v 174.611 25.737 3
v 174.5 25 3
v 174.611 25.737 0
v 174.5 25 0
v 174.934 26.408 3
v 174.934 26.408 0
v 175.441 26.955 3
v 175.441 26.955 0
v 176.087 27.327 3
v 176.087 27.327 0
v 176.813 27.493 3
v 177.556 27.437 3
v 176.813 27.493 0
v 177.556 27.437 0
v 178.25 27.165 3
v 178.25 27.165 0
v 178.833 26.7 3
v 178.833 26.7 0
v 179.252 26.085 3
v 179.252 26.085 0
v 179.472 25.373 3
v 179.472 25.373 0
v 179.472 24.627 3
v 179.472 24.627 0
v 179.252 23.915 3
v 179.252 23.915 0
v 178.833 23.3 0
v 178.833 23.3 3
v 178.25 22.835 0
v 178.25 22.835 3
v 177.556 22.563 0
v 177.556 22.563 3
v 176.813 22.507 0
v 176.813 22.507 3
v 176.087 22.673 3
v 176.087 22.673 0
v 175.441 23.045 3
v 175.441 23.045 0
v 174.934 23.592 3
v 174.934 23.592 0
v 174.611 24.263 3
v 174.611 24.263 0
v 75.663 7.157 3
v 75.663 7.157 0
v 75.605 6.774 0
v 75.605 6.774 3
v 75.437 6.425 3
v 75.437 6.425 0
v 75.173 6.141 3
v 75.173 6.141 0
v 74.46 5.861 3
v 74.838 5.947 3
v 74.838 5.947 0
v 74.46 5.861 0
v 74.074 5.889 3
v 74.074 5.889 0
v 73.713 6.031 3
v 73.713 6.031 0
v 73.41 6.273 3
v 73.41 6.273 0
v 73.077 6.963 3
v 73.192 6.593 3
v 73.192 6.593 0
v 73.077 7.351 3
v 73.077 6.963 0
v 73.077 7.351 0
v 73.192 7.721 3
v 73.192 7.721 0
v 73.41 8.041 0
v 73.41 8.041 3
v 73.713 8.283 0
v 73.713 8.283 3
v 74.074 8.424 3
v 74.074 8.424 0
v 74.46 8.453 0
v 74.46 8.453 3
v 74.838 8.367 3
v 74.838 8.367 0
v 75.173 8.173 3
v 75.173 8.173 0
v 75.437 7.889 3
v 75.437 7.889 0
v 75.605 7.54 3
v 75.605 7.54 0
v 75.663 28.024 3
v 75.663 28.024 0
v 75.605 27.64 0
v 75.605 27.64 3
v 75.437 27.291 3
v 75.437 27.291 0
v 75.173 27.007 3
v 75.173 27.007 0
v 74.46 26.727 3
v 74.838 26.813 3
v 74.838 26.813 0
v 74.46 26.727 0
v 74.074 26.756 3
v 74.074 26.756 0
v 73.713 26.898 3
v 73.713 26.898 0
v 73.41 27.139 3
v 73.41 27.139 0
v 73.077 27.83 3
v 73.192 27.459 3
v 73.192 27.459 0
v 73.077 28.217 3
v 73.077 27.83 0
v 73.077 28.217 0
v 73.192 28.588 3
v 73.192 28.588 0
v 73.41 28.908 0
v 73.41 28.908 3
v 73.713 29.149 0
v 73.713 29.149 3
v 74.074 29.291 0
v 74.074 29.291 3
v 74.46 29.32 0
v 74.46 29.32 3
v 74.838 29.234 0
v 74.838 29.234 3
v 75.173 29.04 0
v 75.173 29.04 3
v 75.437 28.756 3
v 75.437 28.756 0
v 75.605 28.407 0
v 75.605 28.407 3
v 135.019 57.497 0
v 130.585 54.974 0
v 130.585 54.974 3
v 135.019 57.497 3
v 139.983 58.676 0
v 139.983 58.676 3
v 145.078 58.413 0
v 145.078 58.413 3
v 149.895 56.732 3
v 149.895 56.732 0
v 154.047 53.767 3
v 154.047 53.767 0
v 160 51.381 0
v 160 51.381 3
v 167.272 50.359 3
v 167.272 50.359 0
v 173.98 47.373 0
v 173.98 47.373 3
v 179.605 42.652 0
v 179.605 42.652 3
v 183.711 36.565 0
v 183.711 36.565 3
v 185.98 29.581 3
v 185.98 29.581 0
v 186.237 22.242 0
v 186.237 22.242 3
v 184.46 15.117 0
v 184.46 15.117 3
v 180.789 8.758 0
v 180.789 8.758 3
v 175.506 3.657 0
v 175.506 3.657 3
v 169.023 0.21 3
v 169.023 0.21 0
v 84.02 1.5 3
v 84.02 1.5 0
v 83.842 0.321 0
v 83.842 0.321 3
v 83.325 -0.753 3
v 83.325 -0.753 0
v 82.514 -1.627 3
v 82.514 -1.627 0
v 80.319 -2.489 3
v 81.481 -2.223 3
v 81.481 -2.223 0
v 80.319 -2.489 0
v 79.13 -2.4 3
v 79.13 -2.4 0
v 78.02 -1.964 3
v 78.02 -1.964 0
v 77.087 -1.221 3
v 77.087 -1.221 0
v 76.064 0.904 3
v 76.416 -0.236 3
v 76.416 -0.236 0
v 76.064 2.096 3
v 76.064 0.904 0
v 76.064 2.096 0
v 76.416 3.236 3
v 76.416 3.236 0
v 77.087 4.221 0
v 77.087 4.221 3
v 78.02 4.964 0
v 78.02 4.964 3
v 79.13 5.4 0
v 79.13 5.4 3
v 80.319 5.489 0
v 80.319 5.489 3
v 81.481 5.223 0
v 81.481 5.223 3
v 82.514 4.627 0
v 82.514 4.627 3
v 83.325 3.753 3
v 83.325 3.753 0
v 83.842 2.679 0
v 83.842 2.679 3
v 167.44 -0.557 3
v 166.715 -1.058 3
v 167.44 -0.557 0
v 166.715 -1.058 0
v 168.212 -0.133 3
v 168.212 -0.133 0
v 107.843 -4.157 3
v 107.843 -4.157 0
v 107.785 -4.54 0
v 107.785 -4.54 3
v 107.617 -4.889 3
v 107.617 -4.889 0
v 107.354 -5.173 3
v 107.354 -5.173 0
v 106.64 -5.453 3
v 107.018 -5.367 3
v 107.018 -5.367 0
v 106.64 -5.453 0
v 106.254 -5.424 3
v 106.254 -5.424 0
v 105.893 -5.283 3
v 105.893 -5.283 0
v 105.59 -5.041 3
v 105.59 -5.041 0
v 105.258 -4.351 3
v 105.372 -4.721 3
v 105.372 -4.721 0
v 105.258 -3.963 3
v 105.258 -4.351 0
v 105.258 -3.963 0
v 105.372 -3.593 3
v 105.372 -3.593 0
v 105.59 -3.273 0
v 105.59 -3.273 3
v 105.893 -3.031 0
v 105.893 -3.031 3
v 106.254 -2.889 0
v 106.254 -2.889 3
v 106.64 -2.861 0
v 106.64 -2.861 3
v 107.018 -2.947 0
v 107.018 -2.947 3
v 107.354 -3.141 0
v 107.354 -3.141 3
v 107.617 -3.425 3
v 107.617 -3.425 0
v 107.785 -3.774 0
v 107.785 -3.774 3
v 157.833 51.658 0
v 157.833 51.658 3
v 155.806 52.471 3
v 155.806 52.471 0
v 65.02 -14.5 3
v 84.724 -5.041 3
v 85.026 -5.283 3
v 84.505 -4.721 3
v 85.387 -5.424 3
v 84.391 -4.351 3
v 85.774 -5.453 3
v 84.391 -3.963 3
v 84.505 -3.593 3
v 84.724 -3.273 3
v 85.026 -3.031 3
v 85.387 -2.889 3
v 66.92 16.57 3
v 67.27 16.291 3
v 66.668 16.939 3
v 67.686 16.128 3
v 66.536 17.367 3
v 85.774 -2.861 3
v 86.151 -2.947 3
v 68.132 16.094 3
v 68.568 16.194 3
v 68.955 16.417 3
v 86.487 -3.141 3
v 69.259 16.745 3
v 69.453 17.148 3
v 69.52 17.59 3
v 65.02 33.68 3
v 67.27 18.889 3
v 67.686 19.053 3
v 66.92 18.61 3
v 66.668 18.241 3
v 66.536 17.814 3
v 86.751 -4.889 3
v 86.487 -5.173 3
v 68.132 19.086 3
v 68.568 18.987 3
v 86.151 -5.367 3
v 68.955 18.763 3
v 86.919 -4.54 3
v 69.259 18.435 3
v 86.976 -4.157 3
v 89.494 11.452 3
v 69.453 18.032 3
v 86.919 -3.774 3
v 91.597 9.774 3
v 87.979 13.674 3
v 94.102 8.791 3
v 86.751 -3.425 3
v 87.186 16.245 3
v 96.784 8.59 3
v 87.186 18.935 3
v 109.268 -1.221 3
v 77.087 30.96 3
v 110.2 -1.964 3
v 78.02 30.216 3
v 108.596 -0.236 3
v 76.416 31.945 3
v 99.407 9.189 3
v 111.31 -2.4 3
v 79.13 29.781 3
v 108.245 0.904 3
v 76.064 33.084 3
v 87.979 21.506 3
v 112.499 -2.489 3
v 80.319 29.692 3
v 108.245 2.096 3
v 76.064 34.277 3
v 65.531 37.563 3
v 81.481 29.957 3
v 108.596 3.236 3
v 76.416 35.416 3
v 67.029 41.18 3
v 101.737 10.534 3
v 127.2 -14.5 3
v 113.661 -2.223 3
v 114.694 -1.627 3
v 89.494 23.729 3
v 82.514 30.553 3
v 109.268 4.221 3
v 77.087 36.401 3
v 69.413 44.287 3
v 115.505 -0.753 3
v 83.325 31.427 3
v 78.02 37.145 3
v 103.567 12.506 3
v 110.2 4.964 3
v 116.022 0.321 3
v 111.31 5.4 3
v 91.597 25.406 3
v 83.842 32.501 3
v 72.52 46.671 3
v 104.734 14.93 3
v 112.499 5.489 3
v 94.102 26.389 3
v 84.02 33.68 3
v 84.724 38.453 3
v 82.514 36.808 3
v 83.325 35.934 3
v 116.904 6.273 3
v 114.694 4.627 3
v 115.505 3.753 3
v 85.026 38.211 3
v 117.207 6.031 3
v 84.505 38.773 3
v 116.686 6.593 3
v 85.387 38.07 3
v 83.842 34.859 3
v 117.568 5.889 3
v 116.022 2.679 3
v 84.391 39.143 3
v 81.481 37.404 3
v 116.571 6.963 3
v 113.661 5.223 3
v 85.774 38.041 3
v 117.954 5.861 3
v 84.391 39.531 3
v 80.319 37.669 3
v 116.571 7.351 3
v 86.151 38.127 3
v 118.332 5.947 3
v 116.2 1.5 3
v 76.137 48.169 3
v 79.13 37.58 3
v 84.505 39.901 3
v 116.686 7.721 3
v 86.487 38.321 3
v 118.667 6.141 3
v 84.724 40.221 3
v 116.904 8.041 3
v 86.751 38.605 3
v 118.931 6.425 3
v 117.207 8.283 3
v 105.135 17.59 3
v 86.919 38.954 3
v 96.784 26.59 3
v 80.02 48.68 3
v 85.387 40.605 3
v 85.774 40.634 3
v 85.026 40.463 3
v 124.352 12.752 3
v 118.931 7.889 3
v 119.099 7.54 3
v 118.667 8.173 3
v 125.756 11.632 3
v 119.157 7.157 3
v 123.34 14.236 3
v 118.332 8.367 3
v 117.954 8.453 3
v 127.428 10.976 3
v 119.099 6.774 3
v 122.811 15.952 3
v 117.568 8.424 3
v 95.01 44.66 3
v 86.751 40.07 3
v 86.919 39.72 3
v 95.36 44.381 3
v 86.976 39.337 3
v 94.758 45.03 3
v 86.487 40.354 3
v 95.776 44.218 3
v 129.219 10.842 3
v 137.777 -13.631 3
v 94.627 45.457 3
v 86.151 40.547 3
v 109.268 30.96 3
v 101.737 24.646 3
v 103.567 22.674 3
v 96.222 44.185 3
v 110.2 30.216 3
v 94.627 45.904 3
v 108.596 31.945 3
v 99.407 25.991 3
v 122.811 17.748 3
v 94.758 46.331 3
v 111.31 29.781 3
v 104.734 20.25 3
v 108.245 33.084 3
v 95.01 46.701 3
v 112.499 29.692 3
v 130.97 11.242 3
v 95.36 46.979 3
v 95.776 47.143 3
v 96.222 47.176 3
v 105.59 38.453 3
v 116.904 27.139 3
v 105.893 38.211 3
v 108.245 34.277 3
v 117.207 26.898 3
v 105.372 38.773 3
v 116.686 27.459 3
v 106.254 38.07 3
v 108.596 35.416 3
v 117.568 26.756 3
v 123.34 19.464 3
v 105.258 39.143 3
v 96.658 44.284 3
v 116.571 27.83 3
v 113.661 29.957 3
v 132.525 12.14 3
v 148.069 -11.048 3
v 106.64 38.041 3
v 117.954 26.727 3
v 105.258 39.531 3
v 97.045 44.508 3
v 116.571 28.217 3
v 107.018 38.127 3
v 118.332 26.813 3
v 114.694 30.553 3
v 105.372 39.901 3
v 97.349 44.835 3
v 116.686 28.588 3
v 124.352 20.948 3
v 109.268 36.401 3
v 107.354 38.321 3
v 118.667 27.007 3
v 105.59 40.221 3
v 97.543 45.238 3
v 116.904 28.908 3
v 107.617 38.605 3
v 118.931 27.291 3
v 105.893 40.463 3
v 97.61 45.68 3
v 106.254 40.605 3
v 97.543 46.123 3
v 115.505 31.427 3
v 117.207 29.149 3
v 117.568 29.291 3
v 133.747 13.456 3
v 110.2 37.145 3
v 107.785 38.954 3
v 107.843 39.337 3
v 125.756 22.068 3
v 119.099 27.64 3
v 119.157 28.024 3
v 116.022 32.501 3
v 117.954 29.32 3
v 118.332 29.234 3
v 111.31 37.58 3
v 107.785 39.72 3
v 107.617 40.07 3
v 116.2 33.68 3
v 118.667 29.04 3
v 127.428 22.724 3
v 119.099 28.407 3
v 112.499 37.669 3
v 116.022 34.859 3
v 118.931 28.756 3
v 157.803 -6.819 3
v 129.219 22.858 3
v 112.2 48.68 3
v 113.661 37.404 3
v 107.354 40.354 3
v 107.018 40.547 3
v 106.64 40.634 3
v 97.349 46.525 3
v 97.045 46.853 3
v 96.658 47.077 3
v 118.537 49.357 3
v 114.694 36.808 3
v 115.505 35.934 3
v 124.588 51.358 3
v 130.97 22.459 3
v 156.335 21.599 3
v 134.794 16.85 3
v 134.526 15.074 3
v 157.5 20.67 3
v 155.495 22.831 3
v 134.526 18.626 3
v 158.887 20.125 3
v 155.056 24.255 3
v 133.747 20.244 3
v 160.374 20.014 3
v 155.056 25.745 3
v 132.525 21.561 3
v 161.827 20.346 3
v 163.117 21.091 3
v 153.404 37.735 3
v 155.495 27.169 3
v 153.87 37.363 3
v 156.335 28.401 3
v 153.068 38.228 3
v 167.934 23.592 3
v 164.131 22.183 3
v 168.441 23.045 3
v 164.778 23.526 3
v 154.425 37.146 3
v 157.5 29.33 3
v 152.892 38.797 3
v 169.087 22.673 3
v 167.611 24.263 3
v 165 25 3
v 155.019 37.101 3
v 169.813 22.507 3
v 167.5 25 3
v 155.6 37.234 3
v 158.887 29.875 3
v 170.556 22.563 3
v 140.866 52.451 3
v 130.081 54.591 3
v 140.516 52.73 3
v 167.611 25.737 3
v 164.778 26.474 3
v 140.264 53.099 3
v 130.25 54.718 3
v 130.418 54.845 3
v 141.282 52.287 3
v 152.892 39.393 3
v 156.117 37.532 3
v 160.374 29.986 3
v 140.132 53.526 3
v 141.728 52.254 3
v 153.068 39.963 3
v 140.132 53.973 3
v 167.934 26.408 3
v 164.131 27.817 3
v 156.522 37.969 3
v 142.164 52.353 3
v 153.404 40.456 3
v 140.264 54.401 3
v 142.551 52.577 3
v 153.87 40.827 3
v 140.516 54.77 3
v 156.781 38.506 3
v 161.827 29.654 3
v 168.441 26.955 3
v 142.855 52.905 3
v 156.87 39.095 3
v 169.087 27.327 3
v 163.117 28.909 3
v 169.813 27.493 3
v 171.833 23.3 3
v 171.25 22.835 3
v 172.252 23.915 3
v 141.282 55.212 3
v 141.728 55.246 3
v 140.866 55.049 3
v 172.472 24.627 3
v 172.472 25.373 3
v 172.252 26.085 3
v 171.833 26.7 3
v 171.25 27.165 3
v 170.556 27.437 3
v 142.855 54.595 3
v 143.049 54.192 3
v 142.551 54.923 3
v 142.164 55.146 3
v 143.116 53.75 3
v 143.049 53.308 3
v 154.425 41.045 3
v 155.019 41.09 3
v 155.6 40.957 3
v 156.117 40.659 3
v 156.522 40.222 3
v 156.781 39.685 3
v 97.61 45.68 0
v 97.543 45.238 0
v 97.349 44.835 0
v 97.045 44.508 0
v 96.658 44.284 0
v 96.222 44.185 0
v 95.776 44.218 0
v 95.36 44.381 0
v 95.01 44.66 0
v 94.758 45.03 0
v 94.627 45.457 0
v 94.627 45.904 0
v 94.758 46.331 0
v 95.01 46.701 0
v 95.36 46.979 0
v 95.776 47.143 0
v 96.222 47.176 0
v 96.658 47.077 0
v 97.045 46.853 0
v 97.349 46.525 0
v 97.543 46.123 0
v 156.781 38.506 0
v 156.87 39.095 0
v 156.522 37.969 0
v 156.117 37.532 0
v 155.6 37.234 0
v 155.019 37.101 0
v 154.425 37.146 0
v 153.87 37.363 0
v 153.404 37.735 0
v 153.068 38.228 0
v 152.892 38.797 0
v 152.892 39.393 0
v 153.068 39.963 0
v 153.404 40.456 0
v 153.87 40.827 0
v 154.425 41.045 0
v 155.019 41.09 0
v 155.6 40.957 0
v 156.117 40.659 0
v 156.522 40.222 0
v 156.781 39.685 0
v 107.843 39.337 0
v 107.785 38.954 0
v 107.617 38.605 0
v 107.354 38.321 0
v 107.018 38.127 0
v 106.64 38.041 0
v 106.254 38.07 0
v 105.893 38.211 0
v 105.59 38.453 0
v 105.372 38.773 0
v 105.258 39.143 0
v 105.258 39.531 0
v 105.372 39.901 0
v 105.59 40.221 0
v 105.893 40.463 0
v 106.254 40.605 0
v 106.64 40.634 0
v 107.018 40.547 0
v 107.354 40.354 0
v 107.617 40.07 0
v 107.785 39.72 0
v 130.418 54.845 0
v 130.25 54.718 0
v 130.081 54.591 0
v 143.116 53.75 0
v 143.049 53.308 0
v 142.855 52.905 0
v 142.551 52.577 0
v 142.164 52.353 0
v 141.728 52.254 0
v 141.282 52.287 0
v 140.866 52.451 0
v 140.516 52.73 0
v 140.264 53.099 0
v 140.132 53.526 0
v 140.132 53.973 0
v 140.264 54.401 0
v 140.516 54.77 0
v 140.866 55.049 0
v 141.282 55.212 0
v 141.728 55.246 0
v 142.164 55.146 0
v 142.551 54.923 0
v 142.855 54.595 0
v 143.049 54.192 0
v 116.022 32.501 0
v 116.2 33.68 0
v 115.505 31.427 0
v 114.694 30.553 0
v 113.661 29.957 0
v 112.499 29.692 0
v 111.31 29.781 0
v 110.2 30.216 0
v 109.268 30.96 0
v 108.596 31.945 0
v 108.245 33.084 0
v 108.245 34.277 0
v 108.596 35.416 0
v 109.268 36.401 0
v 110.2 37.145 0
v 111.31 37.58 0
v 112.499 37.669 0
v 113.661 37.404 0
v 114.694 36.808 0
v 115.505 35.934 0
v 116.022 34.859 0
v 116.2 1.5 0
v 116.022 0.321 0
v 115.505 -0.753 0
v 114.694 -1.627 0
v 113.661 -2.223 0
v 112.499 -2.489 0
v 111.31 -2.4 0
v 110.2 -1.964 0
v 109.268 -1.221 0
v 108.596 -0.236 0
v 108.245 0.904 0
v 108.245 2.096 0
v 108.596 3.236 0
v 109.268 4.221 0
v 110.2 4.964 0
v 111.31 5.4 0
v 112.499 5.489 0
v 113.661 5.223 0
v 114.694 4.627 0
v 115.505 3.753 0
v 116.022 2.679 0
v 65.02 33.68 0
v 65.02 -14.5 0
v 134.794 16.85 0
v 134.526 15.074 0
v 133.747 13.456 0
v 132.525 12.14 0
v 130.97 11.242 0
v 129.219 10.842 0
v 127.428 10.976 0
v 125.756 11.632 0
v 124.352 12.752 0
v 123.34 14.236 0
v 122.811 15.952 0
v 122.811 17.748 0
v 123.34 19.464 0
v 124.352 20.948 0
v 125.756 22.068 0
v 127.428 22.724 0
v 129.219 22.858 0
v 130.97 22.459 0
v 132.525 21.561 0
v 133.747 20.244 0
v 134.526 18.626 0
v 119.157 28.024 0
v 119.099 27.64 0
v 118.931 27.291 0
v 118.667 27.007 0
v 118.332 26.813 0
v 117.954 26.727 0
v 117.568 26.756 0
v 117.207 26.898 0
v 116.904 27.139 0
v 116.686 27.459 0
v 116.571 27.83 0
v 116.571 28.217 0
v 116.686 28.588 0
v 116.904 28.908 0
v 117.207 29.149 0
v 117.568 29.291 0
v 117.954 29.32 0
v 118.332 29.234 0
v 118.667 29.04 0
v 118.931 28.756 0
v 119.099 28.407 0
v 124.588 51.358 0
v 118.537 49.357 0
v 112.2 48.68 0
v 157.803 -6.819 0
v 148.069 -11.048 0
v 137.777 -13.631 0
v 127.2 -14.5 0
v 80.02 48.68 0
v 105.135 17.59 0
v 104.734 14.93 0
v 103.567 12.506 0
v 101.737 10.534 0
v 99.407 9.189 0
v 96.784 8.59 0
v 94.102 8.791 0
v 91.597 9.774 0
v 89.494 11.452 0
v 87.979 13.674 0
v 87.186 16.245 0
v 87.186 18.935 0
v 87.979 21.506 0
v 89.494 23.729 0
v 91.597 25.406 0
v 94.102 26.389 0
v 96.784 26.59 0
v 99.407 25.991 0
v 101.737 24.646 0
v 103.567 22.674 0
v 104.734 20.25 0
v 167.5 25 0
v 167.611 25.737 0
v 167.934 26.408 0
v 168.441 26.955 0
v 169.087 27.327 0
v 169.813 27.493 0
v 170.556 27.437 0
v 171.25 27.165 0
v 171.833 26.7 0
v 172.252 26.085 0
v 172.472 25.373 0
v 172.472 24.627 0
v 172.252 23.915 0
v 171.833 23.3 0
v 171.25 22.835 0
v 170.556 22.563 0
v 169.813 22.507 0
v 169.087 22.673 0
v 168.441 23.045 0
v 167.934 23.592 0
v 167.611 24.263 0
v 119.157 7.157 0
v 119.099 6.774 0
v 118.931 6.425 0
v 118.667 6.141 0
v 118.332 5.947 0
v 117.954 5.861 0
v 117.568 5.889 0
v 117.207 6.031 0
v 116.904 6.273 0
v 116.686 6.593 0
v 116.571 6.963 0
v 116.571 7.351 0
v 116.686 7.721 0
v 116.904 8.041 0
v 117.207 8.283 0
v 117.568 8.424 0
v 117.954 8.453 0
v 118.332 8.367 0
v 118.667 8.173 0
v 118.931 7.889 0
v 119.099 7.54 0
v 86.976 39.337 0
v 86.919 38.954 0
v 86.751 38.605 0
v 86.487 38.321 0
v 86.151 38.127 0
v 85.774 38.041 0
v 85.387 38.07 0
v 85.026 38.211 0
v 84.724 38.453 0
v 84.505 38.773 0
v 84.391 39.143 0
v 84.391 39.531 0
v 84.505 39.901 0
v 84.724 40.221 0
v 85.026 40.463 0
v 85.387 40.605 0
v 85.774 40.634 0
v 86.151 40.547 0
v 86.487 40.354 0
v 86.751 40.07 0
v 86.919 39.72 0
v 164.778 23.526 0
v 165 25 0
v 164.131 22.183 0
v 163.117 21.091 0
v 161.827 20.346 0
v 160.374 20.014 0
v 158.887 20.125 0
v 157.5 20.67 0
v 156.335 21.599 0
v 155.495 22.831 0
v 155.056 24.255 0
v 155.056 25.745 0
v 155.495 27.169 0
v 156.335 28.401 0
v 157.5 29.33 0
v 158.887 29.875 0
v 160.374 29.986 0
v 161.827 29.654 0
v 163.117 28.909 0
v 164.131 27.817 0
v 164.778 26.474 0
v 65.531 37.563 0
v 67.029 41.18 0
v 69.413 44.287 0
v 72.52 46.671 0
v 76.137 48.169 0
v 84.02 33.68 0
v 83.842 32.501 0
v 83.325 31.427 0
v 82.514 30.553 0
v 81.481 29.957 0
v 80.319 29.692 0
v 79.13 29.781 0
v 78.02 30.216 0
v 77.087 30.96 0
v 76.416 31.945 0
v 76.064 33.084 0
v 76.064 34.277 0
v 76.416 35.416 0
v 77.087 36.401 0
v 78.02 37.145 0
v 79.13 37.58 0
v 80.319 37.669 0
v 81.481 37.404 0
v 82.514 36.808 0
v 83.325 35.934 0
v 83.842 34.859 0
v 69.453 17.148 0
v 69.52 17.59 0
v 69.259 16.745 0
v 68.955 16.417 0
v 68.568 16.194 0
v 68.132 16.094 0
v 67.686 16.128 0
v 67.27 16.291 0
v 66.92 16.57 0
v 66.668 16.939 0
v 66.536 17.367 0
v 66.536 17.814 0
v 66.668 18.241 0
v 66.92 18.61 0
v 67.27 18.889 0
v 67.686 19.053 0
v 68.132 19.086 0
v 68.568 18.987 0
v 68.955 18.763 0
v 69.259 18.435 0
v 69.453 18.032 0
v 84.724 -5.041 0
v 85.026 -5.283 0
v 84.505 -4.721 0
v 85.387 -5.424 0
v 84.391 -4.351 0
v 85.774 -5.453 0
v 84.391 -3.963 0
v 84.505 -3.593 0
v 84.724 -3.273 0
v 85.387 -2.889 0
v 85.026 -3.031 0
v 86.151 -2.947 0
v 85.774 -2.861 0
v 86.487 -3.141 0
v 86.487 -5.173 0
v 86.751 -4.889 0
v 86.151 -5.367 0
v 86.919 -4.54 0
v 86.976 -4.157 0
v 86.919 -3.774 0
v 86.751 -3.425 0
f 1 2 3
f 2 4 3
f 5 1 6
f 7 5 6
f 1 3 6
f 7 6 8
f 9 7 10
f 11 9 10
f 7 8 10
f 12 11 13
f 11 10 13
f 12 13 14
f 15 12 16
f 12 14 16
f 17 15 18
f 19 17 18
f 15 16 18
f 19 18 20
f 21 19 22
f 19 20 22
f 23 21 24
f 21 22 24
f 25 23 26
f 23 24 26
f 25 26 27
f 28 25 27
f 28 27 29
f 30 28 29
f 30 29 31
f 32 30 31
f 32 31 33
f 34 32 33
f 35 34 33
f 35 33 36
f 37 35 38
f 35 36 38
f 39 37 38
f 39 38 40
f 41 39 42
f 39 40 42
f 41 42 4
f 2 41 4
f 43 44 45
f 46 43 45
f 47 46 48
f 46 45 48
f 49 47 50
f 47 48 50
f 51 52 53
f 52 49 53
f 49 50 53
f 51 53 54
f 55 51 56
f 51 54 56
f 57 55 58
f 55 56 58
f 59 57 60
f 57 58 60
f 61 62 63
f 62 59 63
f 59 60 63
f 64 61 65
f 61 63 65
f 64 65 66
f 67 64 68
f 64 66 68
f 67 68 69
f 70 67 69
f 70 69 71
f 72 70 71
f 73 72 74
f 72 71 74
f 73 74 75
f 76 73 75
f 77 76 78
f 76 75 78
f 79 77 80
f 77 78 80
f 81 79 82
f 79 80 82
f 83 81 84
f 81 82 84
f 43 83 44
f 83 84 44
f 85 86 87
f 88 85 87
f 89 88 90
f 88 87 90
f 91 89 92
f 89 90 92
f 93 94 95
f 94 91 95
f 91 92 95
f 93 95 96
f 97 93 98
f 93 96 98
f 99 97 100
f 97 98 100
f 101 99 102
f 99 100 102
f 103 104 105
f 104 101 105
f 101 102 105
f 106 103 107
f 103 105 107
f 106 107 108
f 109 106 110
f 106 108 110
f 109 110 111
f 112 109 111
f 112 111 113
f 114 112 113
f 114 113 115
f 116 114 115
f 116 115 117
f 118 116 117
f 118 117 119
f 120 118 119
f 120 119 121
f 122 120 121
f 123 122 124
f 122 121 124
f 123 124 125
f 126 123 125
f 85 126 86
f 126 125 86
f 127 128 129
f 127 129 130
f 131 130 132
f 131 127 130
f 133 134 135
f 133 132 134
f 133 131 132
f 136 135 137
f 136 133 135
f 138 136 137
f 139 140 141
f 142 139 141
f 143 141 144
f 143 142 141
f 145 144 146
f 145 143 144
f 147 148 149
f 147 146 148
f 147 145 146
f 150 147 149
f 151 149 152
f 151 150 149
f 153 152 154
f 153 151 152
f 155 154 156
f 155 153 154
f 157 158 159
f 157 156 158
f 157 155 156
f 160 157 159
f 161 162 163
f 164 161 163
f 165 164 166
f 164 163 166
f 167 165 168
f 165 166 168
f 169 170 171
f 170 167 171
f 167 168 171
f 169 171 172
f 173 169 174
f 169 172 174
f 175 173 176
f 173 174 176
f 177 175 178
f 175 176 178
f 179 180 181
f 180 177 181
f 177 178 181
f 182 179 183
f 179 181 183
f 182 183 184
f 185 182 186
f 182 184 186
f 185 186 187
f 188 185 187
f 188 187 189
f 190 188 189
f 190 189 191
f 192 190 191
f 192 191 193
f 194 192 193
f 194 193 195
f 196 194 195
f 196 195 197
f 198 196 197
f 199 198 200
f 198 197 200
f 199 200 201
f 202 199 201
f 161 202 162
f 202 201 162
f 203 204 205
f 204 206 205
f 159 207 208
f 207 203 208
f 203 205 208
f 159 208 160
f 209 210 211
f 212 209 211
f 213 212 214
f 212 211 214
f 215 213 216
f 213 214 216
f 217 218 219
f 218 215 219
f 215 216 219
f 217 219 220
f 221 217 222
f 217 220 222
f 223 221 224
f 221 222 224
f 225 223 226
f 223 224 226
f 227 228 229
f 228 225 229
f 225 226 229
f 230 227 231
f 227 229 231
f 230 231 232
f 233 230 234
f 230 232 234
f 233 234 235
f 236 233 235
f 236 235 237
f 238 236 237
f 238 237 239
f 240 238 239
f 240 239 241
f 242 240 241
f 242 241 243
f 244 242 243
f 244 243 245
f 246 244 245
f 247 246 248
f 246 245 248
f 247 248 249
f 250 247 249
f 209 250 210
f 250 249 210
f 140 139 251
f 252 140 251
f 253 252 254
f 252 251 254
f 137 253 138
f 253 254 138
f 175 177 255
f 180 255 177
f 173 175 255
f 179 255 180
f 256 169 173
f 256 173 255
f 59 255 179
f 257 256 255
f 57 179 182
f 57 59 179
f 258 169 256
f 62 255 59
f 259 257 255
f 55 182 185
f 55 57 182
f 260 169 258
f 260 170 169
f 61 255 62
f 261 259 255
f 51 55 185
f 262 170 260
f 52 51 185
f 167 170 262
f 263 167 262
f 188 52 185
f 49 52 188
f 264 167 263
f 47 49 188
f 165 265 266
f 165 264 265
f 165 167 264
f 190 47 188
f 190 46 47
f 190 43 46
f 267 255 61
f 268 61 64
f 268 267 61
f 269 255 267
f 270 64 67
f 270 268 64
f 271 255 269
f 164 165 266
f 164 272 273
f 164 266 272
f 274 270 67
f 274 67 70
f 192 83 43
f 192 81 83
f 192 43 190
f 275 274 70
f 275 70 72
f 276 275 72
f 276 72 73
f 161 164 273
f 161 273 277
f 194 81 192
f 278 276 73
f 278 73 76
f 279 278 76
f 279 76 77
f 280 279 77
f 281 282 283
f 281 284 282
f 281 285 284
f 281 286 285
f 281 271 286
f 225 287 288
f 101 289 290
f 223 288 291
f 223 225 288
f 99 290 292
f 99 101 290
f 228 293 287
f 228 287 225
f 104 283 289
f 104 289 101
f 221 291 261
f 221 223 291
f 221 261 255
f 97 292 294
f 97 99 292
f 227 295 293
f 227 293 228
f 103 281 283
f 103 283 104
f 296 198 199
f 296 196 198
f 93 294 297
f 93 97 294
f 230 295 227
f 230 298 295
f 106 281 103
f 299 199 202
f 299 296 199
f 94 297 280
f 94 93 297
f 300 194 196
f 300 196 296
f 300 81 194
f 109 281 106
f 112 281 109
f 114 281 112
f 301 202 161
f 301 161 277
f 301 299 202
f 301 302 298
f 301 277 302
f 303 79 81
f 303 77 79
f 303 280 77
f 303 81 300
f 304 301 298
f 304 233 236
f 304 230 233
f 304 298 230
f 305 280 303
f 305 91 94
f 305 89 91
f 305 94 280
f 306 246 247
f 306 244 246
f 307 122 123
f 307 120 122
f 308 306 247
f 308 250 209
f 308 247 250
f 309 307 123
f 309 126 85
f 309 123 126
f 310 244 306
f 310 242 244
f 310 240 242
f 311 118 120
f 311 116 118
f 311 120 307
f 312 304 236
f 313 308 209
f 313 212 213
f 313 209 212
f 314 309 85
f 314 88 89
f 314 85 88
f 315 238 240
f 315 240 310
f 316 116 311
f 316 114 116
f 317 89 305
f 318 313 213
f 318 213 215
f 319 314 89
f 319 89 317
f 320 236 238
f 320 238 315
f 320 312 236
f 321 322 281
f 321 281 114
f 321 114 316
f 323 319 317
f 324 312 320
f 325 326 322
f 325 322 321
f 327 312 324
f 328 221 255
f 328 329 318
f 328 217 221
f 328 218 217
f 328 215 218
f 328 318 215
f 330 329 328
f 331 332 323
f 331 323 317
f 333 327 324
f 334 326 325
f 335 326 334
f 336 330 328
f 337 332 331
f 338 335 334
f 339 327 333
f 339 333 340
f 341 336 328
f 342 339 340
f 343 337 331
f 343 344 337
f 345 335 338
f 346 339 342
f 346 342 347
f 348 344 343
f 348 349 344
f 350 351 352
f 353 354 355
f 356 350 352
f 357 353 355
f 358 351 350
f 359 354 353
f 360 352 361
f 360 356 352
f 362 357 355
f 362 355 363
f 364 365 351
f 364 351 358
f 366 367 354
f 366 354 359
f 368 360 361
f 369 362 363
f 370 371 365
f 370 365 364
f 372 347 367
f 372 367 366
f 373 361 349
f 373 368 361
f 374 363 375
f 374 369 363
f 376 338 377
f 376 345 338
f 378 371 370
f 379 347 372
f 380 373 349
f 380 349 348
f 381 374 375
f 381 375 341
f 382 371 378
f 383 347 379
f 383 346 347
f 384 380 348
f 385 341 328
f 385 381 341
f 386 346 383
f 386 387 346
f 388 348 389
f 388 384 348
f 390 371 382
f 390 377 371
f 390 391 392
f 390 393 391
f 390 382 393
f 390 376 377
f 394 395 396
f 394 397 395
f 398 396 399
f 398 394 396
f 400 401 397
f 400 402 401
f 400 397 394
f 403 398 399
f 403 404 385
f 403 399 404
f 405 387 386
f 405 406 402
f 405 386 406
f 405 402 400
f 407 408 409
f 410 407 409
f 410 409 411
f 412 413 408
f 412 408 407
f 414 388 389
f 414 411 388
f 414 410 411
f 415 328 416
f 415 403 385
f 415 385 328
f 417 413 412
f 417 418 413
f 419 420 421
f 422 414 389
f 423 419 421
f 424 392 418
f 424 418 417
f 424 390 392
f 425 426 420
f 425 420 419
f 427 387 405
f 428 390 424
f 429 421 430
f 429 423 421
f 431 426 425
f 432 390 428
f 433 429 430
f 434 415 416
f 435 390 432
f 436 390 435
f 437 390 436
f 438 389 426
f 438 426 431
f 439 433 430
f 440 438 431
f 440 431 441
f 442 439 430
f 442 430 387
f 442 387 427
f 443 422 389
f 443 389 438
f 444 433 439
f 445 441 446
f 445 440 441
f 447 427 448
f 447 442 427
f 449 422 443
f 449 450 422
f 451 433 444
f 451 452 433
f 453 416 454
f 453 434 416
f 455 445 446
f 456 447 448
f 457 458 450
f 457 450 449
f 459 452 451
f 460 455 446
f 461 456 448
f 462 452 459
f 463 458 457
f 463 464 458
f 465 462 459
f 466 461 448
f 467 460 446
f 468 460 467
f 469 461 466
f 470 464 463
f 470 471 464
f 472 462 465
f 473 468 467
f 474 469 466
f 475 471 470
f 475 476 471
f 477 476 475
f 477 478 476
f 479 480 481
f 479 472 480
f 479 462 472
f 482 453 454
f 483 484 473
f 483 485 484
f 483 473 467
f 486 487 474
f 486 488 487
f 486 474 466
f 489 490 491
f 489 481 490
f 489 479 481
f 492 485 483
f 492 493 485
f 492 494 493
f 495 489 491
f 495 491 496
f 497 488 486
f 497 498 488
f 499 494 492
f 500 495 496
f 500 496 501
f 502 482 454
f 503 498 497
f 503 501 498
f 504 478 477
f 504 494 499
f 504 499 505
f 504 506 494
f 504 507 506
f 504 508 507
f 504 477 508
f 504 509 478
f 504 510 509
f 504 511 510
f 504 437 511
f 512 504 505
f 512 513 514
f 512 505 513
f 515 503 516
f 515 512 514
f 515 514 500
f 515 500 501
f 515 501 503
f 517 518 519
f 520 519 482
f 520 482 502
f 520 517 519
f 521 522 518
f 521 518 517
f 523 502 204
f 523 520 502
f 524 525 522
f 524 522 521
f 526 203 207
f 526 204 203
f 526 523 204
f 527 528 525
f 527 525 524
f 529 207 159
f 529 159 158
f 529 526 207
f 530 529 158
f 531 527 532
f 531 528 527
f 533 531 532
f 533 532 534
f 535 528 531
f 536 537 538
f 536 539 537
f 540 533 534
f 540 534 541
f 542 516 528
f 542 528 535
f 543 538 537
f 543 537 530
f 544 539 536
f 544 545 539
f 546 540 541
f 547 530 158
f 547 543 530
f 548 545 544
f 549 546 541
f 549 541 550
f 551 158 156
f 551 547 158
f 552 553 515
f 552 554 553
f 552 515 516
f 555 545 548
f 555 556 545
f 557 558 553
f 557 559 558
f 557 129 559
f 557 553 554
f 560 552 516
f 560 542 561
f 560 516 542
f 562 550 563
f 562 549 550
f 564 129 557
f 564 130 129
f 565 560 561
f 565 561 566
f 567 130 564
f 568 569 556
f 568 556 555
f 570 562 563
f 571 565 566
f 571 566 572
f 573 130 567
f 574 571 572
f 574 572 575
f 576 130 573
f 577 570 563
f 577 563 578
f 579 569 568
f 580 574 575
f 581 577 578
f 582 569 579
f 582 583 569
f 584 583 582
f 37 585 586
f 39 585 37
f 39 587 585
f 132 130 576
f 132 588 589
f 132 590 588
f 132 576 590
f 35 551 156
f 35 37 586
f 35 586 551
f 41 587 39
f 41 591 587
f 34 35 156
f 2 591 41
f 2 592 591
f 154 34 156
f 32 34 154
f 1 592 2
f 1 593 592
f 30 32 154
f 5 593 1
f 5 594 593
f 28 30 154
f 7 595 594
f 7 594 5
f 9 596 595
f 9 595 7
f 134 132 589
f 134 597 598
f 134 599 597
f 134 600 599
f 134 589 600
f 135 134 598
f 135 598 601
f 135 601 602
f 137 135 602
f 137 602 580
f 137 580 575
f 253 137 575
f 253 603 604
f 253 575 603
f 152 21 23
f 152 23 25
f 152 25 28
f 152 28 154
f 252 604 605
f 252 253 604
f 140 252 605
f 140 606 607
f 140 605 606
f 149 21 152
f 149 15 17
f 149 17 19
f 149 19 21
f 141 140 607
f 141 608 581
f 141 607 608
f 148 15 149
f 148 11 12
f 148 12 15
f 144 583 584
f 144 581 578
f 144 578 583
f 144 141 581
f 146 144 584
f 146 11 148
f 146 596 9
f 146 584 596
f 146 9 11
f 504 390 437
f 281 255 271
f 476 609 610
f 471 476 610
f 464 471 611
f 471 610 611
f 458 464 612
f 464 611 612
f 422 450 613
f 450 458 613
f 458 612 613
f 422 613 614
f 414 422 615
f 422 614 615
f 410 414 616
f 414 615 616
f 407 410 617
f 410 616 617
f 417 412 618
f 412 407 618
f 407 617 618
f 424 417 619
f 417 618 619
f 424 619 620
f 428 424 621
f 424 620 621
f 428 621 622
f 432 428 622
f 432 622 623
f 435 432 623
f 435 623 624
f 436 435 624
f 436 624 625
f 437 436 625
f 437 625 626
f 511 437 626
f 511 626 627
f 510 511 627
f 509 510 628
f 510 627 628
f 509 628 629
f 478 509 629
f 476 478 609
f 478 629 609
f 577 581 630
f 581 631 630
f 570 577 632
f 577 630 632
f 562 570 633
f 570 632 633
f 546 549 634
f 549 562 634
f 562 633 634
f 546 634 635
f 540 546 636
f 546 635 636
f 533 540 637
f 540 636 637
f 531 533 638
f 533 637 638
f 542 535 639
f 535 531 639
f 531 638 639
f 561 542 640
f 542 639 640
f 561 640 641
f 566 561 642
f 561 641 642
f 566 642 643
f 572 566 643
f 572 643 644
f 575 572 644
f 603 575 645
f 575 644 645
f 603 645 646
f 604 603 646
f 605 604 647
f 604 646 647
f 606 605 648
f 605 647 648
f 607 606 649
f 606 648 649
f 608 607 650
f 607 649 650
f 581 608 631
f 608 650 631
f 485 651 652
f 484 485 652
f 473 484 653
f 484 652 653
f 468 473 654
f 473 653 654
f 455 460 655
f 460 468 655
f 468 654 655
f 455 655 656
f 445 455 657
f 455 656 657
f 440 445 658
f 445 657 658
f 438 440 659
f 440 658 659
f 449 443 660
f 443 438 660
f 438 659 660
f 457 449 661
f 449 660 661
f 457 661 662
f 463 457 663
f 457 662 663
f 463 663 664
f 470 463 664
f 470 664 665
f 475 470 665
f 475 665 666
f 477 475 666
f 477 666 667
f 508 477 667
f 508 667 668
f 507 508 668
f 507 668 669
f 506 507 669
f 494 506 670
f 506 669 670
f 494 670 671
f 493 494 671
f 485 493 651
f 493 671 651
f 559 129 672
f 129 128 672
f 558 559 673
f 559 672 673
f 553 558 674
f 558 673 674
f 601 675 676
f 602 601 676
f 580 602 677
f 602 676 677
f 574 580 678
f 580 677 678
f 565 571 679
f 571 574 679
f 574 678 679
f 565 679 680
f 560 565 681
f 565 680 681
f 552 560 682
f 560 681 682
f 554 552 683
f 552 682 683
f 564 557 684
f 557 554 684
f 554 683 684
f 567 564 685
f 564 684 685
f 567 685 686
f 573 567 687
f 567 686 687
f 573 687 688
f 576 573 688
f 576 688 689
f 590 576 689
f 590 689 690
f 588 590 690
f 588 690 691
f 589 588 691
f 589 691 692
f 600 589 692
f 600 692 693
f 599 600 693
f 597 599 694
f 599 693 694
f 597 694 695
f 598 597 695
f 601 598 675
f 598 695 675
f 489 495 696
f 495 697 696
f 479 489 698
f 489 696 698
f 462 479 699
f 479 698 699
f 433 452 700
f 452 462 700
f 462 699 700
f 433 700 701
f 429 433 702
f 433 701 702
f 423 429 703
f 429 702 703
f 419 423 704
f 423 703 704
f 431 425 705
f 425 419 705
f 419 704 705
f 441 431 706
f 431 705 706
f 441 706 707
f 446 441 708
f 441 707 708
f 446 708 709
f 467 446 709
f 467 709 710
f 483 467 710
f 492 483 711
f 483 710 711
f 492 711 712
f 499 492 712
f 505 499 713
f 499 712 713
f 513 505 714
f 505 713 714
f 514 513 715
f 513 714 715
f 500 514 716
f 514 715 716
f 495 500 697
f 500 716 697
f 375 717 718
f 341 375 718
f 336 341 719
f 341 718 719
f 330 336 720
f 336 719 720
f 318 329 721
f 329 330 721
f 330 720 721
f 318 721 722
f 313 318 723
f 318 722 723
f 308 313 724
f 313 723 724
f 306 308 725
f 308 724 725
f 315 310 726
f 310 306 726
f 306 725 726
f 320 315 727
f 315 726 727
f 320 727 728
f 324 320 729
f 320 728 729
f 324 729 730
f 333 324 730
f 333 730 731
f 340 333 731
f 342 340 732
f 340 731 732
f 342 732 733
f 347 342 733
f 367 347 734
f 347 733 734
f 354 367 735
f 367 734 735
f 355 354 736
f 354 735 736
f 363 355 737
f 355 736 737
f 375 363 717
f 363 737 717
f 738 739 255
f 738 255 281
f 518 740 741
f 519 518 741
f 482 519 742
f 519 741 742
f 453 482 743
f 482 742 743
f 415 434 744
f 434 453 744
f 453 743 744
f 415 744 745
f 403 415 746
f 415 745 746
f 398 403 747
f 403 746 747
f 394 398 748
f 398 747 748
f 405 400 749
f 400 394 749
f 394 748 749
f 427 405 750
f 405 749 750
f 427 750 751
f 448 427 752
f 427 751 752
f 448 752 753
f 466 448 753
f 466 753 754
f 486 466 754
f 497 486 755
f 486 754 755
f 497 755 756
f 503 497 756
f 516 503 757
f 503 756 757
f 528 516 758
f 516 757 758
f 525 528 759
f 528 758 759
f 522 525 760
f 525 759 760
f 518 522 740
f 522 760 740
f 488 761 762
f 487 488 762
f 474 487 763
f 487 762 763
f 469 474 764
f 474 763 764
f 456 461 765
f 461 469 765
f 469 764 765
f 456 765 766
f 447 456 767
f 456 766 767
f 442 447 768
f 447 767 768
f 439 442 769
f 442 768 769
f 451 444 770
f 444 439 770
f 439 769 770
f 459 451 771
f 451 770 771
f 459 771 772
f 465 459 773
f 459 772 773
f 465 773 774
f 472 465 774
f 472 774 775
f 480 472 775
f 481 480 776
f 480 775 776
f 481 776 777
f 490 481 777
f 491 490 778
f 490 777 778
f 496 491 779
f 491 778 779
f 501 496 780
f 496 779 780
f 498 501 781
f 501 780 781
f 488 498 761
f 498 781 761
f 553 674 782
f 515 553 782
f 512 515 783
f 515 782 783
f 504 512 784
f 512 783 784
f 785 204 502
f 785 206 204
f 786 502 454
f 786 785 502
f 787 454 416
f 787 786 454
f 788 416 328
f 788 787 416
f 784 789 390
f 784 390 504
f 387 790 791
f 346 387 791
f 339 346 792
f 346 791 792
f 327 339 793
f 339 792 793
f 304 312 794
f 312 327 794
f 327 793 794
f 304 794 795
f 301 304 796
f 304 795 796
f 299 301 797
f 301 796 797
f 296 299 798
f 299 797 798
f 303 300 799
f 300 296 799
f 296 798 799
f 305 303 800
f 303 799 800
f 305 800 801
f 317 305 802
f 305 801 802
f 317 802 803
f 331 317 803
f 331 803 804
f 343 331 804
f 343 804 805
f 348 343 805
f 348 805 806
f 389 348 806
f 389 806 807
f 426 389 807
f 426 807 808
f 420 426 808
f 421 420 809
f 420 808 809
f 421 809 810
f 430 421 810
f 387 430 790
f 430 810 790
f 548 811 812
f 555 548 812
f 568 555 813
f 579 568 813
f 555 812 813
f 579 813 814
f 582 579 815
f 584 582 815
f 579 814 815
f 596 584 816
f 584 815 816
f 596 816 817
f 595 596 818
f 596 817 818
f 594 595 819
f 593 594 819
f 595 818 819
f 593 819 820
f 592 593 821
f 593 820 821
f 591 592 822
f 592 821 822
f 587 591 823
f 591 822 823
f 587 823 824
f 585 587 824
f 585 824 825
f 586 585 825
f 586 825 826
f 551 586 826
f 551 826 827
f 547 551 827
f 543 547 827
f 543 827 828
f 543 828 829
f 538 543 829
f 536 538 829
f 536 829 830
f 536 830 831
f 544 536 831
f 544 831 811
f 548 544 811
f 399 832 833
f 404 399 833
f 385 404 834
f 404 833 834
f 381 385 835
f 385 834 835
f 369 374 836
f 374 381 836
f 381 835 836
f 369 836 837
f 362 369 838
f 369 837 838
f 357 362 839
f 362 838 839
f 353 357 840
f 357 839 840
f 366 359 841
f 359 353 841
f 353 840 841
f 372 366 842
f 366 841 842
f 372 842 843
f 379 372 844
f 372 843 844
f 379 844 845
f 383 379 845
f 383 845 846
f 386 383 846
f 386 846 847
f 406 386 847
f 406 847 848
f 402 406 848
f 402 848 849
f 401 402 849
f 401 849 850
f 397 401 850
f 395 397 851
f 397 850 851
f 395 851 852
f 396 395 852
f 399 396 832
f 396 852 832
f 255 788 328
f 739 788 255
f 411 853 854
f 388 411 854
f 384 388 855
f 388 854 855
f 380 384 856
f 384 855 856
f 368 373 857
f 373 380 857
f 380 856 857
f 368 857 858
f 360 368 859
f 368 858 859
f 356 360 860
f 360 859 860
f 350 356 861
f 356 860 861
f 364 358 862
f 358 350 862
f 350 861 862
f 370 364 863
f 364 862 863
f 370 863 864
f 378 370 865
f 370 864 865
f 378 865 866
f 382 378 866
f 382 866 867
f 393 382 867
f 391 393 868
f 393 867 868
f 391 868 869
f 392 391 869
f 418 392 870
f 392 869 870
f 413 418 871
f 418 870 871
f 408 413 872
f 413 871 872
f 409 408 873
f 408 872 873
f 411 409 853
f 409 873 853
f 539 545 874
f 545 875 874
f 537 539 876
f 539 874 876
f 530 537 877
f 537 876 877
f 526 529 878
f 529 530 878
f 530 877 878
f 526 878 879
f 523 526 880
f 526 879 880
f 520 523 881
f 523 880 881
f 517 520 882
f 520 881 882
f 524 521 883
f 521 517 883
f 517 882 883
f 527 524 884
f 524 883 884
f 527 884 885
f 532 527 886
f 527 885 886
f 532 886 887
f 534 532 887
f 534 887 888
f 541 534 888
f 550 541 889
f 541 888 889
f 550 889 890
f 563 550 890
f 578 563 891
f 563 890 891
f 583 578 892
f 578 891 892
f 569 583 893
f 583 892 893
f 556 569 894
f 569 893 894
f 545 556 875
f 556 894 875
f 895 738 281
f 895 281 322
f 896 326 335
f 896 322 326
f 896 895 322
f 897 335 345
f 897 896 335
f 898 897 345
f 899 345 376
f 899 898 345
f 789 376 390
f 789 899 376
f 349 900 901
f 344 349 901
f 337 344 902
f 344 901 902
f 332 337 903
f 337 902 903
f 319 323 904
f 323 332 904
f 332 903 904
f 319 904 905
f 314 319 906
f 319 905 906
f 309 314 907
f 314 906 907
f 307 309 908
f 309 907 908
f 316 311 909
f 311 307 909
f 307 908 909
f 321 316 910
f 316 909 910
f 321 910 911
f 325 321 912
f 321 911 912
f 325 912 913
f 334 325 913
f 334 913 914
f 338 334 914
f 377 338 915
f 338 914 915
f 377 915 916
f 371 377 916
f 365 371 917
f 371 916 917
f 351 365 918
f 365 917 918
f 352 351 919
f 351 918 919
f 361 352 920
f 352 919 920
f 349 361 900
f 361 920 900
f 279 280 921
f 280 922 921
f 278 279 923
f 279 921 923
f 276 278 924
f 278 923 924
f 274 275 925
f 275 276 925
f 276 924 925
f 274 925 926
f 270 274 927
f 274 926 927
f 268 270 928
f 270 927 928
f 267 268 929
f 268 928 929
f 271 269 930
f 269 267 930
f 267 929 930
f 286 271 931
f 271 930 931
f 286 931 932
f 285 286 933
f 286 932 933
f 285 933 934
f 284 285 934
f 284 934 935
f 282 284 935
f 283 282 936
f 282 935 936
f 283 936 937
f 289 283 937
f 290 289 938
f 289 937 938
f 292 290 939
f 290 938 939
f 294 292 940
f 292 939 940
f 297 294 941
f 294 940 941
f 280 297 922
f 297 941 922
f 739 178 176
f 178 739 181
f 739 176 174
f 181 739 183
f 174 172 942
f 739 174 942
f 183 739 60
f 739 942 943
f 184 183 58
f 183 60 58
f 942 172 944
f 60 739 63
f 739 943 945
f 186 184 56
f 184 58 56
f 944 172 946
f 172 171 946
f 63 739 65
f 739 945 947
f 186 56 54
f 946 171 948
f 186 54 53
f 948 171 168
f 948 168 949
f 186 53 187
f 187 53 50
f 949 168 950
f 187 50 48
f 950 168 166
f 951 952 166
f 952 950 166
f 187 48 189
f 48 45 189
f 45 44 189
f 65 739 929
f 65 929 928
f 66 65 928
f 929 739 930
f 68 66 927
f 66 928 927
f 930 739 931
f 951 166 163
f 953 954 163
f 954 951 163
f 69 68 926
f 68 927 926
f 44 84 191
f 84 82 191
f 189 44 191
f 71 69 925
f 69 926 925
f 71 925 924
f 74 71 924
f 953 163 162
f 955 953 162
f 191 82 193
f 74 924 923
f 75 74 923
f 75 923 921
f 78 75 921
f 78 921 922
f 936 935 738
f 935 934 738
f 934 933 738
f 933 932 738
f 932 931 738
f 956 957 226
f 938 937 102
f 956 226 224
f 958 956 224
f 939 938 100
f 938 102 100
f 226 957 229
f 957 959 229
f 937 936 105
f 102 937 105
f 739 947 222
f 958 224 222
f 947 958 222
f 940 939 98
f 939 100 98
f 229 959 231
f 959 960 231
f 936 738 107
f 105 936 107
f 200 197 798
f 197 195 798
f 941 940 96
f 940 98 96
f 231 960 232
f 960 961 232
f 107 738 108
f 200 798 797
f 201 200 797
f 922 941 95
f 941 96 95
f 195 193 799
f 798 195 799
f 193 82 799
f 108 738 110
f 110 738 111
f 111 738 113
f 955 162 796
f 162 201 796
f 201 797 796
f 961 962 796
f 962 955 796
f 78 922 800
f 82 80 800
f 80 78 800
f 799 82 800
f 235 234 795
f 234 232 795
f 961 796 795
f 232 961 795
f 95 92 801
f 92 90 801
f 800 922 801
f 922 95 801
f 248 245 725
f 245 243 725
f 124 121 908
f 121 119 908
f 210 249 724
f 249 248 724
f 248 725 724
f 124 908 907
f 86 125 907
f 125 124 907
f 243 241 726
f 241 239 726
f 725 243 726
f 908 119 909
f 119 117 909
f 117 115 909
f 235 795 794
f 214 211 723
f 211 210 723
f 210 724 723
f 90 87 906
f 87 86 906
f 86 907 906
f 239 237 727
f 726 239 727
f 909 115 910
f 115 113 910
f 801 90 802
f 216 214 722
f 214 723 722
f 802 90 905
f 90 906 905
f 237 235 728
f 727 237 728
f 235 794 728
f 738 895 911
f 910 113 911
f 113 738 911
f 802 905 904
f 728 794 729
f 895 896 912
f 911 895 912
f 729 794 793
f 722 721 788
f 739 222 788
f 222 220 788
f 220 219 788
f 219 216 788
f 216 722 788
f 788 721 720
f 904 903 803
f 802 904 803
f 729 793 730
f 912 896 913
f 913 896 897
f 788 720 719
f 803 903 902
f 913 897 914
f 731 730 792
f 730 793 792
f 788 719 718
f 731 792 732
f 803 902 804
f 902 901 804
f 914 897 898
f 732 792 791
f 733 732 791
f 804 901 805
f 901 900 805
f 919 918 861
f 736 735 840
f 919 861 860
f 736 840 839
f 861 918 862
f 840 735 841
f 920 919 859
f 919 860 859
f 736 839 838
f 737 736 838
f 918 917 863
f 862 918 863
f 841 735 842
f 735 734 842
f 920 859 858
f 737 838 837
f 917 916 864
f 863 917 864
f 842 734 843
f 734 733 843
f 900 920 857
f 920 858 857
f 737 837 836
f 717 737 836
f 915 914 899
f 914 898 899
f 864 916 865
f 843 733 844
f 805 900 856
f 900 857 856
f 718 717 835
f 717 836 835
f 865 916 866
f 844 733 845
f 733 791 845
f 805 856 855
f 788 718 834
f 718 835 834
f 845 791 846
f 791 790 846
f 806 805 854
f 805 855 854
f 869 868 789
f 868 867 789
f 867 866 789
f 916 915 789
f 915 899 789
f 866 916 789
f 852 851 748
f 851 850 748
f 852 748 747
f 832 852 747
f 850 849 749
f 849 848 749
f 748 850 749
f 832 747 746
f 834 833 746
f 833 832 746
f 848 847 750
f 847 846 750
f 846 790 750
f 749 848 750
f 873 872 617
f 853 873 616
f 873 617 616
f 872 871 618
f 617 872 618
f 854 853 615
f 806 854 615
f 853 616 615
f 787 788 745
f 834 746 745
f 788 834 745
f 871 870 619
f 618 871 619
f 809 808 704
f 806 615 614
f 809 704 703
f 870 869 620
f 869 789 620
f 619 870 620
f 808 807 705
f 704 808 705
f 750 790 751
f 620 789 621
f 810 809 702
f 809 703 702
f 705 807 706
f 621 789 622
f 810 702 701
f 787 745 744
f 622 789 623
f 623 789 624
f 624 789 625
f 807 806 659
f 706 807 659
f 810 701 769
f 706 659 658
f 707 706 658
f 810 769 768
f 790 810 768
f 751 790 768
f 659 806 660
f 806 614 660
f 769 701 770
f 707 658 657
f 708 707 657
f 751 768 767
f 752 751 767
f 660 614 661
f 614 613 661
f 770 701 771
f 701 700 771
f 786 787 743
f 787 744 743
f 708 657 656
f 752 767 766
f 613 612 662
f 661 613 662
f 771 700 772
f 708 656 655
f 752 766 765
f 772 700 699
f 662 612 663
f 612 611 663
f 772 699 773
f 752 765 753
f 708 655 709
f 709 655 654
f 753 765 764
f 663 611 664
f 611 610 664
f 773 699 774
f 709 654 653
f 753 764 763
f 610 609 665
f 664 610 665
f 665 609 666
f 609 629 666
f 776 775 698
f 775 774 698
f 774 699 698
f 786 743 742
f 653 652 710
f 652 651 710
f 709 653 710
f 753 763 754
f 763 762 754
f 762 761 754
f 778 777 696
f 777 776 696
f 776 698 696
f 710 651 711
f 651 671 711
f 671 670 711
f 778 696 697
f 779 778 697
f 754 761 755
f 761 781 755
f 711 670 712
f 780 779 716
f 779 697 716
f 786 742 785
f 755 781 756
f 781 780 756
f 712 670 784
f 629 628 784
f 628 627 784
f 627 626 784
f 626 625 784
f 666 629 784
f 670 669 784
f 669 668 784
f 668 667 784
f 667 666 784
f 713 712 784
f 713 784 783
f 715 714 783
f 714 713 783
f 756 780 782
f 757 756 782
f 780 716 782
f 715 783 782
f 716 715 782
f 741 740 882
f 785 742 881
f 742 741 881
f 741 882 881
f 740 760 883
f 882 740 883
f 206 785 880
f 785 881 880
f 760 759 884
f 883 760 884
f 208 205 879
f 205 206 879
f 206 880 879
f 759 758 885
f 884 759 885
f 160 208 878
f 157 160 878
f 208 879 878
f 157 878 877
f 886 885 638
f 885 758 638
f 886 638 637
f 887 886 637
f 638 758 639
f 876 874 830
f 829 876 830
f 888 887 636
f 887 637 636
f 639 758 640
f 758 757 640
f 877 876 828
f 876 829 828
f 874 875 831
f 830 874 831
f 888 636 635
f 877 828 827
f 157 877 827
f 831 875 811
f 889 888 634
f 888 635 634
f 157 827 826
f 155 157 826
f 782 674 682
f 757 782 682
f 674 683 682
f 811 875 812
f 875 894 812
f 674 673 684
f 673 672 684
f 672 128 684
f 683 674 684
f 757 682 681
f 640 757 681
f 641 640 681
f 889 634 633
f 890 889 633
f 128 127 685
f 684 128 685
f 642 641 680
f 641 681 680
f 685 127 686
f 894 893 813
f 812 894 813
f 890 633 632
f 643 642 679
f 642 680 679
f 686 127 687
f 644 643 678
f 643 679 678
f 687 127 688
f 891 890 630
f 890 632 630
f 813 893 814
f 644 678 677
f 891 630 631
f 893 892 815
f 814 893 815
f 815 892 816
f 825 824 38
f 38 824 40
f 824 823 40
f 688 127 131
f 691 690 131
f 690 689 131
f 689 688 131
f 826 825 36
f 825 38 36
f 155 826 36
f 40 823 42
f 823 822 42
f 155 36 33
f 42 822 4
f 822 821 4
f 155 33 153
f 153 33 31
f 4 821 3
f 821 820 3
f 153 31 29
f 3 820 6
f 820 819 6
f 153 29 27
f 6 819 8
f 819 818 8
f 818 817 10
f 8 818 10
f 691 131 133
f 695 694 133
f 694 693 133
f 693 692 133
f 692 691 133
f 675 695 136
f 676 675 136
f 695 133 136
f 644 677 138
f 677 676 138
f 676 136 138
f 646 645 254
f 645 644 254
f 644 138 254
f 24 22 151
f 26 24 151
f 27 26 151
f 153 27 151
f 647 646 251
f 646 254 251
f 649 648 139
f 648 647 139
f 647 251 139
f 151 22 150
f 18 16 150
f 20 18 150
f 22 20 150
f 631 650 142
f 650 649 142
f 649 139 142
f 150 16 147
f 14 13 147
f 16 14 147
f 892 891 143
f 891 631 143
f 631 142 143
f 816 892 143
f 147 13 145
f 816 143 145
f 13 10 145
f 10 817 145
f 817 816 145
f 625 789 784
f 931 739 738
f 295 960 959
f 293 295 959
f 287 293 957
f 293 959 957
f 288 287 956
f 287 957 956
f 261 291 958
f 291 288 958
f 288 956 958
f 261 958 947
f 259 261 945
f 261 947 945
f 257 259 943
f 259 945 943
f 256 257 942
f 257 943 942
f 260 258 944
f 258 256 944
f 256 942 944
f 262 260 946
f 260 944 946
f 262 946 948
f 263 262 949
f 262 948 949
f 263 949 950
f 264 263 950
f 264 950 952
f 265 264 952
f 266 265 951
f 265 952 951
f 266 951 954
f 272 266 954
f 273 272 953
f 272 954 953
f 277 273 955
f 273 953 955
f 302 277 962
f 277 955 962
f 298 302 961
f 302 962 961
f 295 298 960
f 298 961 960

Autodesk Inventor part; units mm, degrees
ref_plane "YZ Plane" through (0, 0, 0) normal (1, 0, 0) x (0, 1, 0)
ref_plane "XZ Plane" through (0, 0, 0) normal (0, 1, 0) x (-1, 0, 0)
ref_plane "XY Plane" through (0, 0, 0) normal (0, 0, 1) x (1, 0, 0)
sketch "スケッチ1" plane through (0, 0, 0) normal (0, 0, 1) x (1, 0, 0)
  line L0 (65.0196, -14.5) -> (65.0196, 33.6804)
  circle A0 centre (80.0196, 33.6804) radius 15 construction
  line L1 (80.0196, 48.6804) -> (112.2, 48.6804)
  circle A1 centre (112.2, 33.6804) radius 15 construction
  line L2 (127.2, -14.5) -> (65.0196, -14.5)
  circle A2 centre (80.0196, 33.6804) radius 3.05 construction
  circle A3 centre (112.2, 33.6804) radius 3.05 construction
  circle A4 centre (112.2, 1.5) radius 3.05 construction
  circle A5 centre (80.0196, 1.5) radius 3.05 construction
  circle A6 centre (96.1098, 17.5902) radius 2.85 construction
  circle A7 centre (128.7687, 16.8502) radius 5.7 construction
  circle A8 centre (160, 25) radius 21.5 construction
  circle A9 centre (128.7687, 16.8502) radius 28.5 construction
  circle A10 centre (128.7687, 16.8502) radius 29.4672 construction
  circle A11 centre (160, 25) radius 25.8772 construction
  circle A12 centre (80.0196, 33.6804) radius 4
  circle A13 centre (112.2, 33.6804) radius 4
  circle A14 centre (80.0196, 1.5) radius 4
  circle A15 centre (112.2, 1.5) radius 4
  arc A16 (112.2, 48.6804) -> (130.0806, 54.5913) centre (112.2, 78.6804) ccw
  arc A17 (153.3164, 53.0826) -> (160, 50.3812) centre (160, 60) ccw
  arc A18 (153.3164, 53.0826) -> (130.0806, 54.5913) centre (140.809, 40.1379) ccw
  circle A19 centre (96.1098, 17.5902) radius 9.025
  circle A20 centre (128.7687, 16.8502) radius 6.025
  circle A21 centre (160, 25) radius 5
  arc A22 (168.6809, 1.1495) -> (160, 50.3812) centre (160, 25) ccw
  arc A23 (168.6809, 1.1495) -> (165.807, -0.5048) centre (171.9707, -7.8892) ccw
  circle A24 centre (171.9707, -7.8892) radius 8.6188 construction
  arc A25 (127.2, -14.5) -> (165.807, -0.5048) centre (127.2, 45.748) ccw
  circle A26 centre (160, 60) radius 8.6188 construction
  circle A27 centre (154.8697, 39.0954) radius 3 construction
  circle A28 centre (154.8697, 39.0954) radius 2
  arc A29 (157.2213, 29.1568) -> (99.1742, 26.079) centre (128.7687, 16.8502) ccw construction
  arc A30 (98.7866, 8.9713) -> (159.6067, 20.0155) centre (128.7687, 16.8502) ccw construction
  arc A31 (80.0196, 48.6804) -> (65.0196, 33.6804) centre (80.0196, 33.6804) ccw
  circle A32 centre (68.0196, 17.5902) radius 1.5
  circle A33 centre (96.1098, 45.6804) radius 1.5
  circle A34 centre (74.3628, 28.0235) radius 1.3
  circle A35 centre (85.6765, 39.3372) radius 1.3
  circle A36 centre (106.5431, 39.3372) radius 1.3
  circle A37 centre (117.8569, 28.0235) radius 1.3
  circle A38 centre (117.8569, 7.1569) radius 1.3
  circle A39 centre (106.5431, -4.1569) radius 1.3
  circle A40 centre (85.6765, -4.1569) radius 1.3
  circle A41 centre (74.3628, 7.1569) radius 1.3
  line L3 (74.3628, 28.0235) -> (85.6765, 39.3372) construction
  line L4 (65.0196, -14.5) -> (65.0196, 33.6804)
  circle A42 centre (80.0196, 33.6804) radius 15 construction
  line L5 (80.0196, 48.6804) -> (112.2, 48.6804)
  circle A43 centre (112.2, 33.6804) radius 15 construction
  line L6 (127.2, -14.5) -> (65.0196, -14.5)
  circle A44 centre (80.0196, 33.6804) radius 3.05 construction
  circle A45 centre (112.2, 33.6804) radius 3.05 construction
  circle A46 centre (112.2, 1.5) radius 3.05 construction
  circle A47 centre (80.0196, 1.5) radius 3.05 construction
  circle A48 centre (96.1098, 17.5902) radius 2.85 construction
  circle A49 centre (128.7687, 16.8502) radius 5.7 construction
  circle A50 centre (160, 25) radius 21.5 construction
  circle A51 centre (128.7687, 16.8502) radius 28.5 construction
  circle A52 centre (128.7687, 16.8502) radius 29.4672 construction
  circle A53 centre (160, 25) radius 25.8772 construction
  circle A54 centre (80.0196, 33.6804) radius 6
  circle A55 centre (112.2, 33.6804) radius 6
  circle A56 centre (80.0196, 1.5) radius 6
  circle A57 centre (112.2, 1.5) radius 6
  arc A58 (112.2, 48.6804) -> (130.5847, 54.9738) centre (112.2, 78.6804) ccw
  arc A59 (154.0473, 53.767) -> (160, 51.3812) centre (160, 60) ccw
  arc A60 (154.0473, 53.767) -> (130.5847, 54.9738) centre (141.6155, 40.7498) ccw
  circle A61 centre (96.1098, 17.5902) radius 9.025
  circle A62 centre (128.7687, 16.8502) radius 6.025
  circle A63 centre (160, 25) radius 2
  arc A64 (169.0229, 0.2098) -> (160, 51.3812) centre (160, 25) ccw
  arc A65 (169.0229, 0.2098) -> (166.7152, -1.0582) centre (171.9707, -7.8892) ccw
  circle A66 centre (171.9707, -7.8892) radius 8.6188 construction
  arc A67 (127.2, -14.5) -> (166.7152, -1.0582) centre (127.2, 50.3027) ccw
  circle A68 centre (160, 60) radius 8.6188 construction
  circle A69 centre (154.8697, 39.0954) radius 3 construction
  circle A70 centre (154.8697, 39.0954) radius 2
  arc A71 (158.348, 26.1273) -> (99.1742, 26.079) centre (128.7687, 16.8502) ccw construction
  arc A72 (98.7866, 8.9713) -> (159.1094, 23.2092) centre (128.7687, 16.8502) ccw construction
  arc A73 (80.0196, 48.6804) -> (65.0196, 33.6804) centre (80.0196, 33.6804) ccw
  circle A74 centre (141.6155, 53.7498) radius 5 construction
  circle A75 centre (141.6155, 53.7498) radius 4
  circle A76 centre (141.6155, 53.7498) radius 1.5
  point P0 (0, 0)
  point P1 (0, 0)
  point P2 (96.1924, 17.5902)
  point P3 (80.1022, 1.5)
  point P4 (112.2826, 1.5)
  point P5 (112.2826, 33.6804)
  point P6 (80.1962, 33.857)
  point P7 (160, 60)
  point P8 (0, 0)
  point P9 (96.1924, 17.5902)
  point P10 (80.1022, 1.5)
  point P11 (112.2826, 1.5)
  point P12 (112.2826, 33.6804)
  point P13 (80.1022, 33.6804)
  point P14 (160, 60)
  point P15 (148.0694, -11.0476)
  point P16 (129.8149, 10.9168)
  point P17 (127.7224, 22.7837)
  point P18 (97.677, 8.7023)
  point P19 (94.5426, 26.4781)
  dimension "d0" = 8
  dimension "d1" = 30
  dimension "d2" = 18.05
  dimension "d3" = 12.05
  dimension "d4" = 10
  dimension "d5" = 1
  dimension "d6" = 18
  dimension "d7" = 4
  dimension "d8" = 31
  dimension "d9" = 32.2772
  dimension "d10" = 60.248
  dimension "d13" = 3
  dimension "d14" = 3
  dimension "d15" = 2.6
  dimension "d16" = 16
  dimension "d25" = 12
  dimension "d26" = 30
  dimension "d27" = 18.05
  dimension "d28" = 12.05
  dimension "d29" = 4
  dimension "d30" = 0
  dimension "d31" = 18
  dimension "d32" = 4
  dimension "d33" = 31
  dimension "d34" = 64.8027
  dimension "d35" = 10
  dimension "d36" = 8
  dimension "d37" = 3
extrude "押し出し1" add sketch "スケッチ1" along normal blind 3 contours L0 A31 L1 A16 A18 A17 A22 A23 A25 L2 | A25 A23 A22 A17 A18 A58 A60 A59 A64 A65 A67 | A54 | A55 | A56 | A57 | A75
sketch "スケッチ2" plane through (0, 0, 0) normal (0, 0, -1) x (-1, 0, 0)
  line L0 (-65.0196, -14.5) -> (-127.2, -14.5) projected
  line L1 (-65.0196, 33.6804) -> (-65.0196, -14.5) projected
  arc A0 (-65.0196, 33.6804) -> (-80.0196, 48.6804) centre (-80.0196, 33.6804) ccw projected
  line L2 (-112.2, 48.6804) -> (-80.0196, 48.6804) projected
  circle A1 centre (-74.3628, 7.1569) radius 1.3 projected
  circle A2 centre (-106.5431, -4.1569) radius 1.3 projected
  circle A3 centre (-117.8569, 28.0235) radius 1.3 projected
  circle A4 centre (-74.3628, 28.0235) radius 1.3 projected
  circle A5 centre (-68.0196, 17.5902) radius 1.5 projected
  circle A6 centre (-96.1098, 45.6804) radius 1.5 projected
  circle A7 centre (-154.8697, 39.0954) radius 2 projected
  circle A8 centre (-128.7687, 16.8502) radius 6.025 projected
  circle A9 centre (-96.1098, 17.5902) radius 9.025 projected
  circle A10 centre (-112.2, 1.5) radius 4 projected
  circle A11 centre (-80.0196, 1.5) radius 4 projected
  circle A12 centre (-112.2, 33.6804) radius 4 projected
  circle A13 centre (-85.6765, 39.3372) radius 1.3 projected
  circle A14 centre (-106.5431, 39.3372) radius 1.3 projected
  circle A15 centre (-117.8569, 7.1569) radius 1.3 projected
  circle A16 centre (-85.6765, -4.1569) radius 1.3 projected
  circle A17 centre (-160, 25) radius 5 projected
  circle A18 centre (-80.0196, 33.6804) radius 4 projected
  circle A19 centre (-170, 25) radius 2.5
  circle A20 centre (-177, 25) radius 2.5
  line L3 (-160, 25) -> (-180.4045, 25) construction
  arc A21 (-166.7152, -1.0582) -> (-127.2, -14.5) centre (-127.2, 50.3027) ccw projected
  arc A22 (-130.5847, 54.9738) -> (-154.0473, 53.767) centre (-141.6155, 40.7498) ccw projected
  arc A23 (-160, 51.3812) -> (-154.0473, 53.767) centre (-160, 60) ccw projected
  arc A24 (-160, 51.3812) -> (-169.0229, 0.2098) centre (-160, 25) ccw projected
  arc A25 (-166.7152, -1.0582) -> (-169.0229, 0.2098) centre (-171.9707, -7.8892) ccw projected
  arc A26 (-130.5847, 54.9738) -> (-112.2, 48.6804) centre (-112.2, 78.6804) ccw projected
  point P0 (0, 0)
  dimension "d20" = 10
  dimension "d21" = 7
  dimension "d22" = 5
extrude "押し出し2" cut sketch "スケッチ2" against normal blind 10 contours A19 | A20
properties part number "中間フレーム" material "アルミニウム 7075"
